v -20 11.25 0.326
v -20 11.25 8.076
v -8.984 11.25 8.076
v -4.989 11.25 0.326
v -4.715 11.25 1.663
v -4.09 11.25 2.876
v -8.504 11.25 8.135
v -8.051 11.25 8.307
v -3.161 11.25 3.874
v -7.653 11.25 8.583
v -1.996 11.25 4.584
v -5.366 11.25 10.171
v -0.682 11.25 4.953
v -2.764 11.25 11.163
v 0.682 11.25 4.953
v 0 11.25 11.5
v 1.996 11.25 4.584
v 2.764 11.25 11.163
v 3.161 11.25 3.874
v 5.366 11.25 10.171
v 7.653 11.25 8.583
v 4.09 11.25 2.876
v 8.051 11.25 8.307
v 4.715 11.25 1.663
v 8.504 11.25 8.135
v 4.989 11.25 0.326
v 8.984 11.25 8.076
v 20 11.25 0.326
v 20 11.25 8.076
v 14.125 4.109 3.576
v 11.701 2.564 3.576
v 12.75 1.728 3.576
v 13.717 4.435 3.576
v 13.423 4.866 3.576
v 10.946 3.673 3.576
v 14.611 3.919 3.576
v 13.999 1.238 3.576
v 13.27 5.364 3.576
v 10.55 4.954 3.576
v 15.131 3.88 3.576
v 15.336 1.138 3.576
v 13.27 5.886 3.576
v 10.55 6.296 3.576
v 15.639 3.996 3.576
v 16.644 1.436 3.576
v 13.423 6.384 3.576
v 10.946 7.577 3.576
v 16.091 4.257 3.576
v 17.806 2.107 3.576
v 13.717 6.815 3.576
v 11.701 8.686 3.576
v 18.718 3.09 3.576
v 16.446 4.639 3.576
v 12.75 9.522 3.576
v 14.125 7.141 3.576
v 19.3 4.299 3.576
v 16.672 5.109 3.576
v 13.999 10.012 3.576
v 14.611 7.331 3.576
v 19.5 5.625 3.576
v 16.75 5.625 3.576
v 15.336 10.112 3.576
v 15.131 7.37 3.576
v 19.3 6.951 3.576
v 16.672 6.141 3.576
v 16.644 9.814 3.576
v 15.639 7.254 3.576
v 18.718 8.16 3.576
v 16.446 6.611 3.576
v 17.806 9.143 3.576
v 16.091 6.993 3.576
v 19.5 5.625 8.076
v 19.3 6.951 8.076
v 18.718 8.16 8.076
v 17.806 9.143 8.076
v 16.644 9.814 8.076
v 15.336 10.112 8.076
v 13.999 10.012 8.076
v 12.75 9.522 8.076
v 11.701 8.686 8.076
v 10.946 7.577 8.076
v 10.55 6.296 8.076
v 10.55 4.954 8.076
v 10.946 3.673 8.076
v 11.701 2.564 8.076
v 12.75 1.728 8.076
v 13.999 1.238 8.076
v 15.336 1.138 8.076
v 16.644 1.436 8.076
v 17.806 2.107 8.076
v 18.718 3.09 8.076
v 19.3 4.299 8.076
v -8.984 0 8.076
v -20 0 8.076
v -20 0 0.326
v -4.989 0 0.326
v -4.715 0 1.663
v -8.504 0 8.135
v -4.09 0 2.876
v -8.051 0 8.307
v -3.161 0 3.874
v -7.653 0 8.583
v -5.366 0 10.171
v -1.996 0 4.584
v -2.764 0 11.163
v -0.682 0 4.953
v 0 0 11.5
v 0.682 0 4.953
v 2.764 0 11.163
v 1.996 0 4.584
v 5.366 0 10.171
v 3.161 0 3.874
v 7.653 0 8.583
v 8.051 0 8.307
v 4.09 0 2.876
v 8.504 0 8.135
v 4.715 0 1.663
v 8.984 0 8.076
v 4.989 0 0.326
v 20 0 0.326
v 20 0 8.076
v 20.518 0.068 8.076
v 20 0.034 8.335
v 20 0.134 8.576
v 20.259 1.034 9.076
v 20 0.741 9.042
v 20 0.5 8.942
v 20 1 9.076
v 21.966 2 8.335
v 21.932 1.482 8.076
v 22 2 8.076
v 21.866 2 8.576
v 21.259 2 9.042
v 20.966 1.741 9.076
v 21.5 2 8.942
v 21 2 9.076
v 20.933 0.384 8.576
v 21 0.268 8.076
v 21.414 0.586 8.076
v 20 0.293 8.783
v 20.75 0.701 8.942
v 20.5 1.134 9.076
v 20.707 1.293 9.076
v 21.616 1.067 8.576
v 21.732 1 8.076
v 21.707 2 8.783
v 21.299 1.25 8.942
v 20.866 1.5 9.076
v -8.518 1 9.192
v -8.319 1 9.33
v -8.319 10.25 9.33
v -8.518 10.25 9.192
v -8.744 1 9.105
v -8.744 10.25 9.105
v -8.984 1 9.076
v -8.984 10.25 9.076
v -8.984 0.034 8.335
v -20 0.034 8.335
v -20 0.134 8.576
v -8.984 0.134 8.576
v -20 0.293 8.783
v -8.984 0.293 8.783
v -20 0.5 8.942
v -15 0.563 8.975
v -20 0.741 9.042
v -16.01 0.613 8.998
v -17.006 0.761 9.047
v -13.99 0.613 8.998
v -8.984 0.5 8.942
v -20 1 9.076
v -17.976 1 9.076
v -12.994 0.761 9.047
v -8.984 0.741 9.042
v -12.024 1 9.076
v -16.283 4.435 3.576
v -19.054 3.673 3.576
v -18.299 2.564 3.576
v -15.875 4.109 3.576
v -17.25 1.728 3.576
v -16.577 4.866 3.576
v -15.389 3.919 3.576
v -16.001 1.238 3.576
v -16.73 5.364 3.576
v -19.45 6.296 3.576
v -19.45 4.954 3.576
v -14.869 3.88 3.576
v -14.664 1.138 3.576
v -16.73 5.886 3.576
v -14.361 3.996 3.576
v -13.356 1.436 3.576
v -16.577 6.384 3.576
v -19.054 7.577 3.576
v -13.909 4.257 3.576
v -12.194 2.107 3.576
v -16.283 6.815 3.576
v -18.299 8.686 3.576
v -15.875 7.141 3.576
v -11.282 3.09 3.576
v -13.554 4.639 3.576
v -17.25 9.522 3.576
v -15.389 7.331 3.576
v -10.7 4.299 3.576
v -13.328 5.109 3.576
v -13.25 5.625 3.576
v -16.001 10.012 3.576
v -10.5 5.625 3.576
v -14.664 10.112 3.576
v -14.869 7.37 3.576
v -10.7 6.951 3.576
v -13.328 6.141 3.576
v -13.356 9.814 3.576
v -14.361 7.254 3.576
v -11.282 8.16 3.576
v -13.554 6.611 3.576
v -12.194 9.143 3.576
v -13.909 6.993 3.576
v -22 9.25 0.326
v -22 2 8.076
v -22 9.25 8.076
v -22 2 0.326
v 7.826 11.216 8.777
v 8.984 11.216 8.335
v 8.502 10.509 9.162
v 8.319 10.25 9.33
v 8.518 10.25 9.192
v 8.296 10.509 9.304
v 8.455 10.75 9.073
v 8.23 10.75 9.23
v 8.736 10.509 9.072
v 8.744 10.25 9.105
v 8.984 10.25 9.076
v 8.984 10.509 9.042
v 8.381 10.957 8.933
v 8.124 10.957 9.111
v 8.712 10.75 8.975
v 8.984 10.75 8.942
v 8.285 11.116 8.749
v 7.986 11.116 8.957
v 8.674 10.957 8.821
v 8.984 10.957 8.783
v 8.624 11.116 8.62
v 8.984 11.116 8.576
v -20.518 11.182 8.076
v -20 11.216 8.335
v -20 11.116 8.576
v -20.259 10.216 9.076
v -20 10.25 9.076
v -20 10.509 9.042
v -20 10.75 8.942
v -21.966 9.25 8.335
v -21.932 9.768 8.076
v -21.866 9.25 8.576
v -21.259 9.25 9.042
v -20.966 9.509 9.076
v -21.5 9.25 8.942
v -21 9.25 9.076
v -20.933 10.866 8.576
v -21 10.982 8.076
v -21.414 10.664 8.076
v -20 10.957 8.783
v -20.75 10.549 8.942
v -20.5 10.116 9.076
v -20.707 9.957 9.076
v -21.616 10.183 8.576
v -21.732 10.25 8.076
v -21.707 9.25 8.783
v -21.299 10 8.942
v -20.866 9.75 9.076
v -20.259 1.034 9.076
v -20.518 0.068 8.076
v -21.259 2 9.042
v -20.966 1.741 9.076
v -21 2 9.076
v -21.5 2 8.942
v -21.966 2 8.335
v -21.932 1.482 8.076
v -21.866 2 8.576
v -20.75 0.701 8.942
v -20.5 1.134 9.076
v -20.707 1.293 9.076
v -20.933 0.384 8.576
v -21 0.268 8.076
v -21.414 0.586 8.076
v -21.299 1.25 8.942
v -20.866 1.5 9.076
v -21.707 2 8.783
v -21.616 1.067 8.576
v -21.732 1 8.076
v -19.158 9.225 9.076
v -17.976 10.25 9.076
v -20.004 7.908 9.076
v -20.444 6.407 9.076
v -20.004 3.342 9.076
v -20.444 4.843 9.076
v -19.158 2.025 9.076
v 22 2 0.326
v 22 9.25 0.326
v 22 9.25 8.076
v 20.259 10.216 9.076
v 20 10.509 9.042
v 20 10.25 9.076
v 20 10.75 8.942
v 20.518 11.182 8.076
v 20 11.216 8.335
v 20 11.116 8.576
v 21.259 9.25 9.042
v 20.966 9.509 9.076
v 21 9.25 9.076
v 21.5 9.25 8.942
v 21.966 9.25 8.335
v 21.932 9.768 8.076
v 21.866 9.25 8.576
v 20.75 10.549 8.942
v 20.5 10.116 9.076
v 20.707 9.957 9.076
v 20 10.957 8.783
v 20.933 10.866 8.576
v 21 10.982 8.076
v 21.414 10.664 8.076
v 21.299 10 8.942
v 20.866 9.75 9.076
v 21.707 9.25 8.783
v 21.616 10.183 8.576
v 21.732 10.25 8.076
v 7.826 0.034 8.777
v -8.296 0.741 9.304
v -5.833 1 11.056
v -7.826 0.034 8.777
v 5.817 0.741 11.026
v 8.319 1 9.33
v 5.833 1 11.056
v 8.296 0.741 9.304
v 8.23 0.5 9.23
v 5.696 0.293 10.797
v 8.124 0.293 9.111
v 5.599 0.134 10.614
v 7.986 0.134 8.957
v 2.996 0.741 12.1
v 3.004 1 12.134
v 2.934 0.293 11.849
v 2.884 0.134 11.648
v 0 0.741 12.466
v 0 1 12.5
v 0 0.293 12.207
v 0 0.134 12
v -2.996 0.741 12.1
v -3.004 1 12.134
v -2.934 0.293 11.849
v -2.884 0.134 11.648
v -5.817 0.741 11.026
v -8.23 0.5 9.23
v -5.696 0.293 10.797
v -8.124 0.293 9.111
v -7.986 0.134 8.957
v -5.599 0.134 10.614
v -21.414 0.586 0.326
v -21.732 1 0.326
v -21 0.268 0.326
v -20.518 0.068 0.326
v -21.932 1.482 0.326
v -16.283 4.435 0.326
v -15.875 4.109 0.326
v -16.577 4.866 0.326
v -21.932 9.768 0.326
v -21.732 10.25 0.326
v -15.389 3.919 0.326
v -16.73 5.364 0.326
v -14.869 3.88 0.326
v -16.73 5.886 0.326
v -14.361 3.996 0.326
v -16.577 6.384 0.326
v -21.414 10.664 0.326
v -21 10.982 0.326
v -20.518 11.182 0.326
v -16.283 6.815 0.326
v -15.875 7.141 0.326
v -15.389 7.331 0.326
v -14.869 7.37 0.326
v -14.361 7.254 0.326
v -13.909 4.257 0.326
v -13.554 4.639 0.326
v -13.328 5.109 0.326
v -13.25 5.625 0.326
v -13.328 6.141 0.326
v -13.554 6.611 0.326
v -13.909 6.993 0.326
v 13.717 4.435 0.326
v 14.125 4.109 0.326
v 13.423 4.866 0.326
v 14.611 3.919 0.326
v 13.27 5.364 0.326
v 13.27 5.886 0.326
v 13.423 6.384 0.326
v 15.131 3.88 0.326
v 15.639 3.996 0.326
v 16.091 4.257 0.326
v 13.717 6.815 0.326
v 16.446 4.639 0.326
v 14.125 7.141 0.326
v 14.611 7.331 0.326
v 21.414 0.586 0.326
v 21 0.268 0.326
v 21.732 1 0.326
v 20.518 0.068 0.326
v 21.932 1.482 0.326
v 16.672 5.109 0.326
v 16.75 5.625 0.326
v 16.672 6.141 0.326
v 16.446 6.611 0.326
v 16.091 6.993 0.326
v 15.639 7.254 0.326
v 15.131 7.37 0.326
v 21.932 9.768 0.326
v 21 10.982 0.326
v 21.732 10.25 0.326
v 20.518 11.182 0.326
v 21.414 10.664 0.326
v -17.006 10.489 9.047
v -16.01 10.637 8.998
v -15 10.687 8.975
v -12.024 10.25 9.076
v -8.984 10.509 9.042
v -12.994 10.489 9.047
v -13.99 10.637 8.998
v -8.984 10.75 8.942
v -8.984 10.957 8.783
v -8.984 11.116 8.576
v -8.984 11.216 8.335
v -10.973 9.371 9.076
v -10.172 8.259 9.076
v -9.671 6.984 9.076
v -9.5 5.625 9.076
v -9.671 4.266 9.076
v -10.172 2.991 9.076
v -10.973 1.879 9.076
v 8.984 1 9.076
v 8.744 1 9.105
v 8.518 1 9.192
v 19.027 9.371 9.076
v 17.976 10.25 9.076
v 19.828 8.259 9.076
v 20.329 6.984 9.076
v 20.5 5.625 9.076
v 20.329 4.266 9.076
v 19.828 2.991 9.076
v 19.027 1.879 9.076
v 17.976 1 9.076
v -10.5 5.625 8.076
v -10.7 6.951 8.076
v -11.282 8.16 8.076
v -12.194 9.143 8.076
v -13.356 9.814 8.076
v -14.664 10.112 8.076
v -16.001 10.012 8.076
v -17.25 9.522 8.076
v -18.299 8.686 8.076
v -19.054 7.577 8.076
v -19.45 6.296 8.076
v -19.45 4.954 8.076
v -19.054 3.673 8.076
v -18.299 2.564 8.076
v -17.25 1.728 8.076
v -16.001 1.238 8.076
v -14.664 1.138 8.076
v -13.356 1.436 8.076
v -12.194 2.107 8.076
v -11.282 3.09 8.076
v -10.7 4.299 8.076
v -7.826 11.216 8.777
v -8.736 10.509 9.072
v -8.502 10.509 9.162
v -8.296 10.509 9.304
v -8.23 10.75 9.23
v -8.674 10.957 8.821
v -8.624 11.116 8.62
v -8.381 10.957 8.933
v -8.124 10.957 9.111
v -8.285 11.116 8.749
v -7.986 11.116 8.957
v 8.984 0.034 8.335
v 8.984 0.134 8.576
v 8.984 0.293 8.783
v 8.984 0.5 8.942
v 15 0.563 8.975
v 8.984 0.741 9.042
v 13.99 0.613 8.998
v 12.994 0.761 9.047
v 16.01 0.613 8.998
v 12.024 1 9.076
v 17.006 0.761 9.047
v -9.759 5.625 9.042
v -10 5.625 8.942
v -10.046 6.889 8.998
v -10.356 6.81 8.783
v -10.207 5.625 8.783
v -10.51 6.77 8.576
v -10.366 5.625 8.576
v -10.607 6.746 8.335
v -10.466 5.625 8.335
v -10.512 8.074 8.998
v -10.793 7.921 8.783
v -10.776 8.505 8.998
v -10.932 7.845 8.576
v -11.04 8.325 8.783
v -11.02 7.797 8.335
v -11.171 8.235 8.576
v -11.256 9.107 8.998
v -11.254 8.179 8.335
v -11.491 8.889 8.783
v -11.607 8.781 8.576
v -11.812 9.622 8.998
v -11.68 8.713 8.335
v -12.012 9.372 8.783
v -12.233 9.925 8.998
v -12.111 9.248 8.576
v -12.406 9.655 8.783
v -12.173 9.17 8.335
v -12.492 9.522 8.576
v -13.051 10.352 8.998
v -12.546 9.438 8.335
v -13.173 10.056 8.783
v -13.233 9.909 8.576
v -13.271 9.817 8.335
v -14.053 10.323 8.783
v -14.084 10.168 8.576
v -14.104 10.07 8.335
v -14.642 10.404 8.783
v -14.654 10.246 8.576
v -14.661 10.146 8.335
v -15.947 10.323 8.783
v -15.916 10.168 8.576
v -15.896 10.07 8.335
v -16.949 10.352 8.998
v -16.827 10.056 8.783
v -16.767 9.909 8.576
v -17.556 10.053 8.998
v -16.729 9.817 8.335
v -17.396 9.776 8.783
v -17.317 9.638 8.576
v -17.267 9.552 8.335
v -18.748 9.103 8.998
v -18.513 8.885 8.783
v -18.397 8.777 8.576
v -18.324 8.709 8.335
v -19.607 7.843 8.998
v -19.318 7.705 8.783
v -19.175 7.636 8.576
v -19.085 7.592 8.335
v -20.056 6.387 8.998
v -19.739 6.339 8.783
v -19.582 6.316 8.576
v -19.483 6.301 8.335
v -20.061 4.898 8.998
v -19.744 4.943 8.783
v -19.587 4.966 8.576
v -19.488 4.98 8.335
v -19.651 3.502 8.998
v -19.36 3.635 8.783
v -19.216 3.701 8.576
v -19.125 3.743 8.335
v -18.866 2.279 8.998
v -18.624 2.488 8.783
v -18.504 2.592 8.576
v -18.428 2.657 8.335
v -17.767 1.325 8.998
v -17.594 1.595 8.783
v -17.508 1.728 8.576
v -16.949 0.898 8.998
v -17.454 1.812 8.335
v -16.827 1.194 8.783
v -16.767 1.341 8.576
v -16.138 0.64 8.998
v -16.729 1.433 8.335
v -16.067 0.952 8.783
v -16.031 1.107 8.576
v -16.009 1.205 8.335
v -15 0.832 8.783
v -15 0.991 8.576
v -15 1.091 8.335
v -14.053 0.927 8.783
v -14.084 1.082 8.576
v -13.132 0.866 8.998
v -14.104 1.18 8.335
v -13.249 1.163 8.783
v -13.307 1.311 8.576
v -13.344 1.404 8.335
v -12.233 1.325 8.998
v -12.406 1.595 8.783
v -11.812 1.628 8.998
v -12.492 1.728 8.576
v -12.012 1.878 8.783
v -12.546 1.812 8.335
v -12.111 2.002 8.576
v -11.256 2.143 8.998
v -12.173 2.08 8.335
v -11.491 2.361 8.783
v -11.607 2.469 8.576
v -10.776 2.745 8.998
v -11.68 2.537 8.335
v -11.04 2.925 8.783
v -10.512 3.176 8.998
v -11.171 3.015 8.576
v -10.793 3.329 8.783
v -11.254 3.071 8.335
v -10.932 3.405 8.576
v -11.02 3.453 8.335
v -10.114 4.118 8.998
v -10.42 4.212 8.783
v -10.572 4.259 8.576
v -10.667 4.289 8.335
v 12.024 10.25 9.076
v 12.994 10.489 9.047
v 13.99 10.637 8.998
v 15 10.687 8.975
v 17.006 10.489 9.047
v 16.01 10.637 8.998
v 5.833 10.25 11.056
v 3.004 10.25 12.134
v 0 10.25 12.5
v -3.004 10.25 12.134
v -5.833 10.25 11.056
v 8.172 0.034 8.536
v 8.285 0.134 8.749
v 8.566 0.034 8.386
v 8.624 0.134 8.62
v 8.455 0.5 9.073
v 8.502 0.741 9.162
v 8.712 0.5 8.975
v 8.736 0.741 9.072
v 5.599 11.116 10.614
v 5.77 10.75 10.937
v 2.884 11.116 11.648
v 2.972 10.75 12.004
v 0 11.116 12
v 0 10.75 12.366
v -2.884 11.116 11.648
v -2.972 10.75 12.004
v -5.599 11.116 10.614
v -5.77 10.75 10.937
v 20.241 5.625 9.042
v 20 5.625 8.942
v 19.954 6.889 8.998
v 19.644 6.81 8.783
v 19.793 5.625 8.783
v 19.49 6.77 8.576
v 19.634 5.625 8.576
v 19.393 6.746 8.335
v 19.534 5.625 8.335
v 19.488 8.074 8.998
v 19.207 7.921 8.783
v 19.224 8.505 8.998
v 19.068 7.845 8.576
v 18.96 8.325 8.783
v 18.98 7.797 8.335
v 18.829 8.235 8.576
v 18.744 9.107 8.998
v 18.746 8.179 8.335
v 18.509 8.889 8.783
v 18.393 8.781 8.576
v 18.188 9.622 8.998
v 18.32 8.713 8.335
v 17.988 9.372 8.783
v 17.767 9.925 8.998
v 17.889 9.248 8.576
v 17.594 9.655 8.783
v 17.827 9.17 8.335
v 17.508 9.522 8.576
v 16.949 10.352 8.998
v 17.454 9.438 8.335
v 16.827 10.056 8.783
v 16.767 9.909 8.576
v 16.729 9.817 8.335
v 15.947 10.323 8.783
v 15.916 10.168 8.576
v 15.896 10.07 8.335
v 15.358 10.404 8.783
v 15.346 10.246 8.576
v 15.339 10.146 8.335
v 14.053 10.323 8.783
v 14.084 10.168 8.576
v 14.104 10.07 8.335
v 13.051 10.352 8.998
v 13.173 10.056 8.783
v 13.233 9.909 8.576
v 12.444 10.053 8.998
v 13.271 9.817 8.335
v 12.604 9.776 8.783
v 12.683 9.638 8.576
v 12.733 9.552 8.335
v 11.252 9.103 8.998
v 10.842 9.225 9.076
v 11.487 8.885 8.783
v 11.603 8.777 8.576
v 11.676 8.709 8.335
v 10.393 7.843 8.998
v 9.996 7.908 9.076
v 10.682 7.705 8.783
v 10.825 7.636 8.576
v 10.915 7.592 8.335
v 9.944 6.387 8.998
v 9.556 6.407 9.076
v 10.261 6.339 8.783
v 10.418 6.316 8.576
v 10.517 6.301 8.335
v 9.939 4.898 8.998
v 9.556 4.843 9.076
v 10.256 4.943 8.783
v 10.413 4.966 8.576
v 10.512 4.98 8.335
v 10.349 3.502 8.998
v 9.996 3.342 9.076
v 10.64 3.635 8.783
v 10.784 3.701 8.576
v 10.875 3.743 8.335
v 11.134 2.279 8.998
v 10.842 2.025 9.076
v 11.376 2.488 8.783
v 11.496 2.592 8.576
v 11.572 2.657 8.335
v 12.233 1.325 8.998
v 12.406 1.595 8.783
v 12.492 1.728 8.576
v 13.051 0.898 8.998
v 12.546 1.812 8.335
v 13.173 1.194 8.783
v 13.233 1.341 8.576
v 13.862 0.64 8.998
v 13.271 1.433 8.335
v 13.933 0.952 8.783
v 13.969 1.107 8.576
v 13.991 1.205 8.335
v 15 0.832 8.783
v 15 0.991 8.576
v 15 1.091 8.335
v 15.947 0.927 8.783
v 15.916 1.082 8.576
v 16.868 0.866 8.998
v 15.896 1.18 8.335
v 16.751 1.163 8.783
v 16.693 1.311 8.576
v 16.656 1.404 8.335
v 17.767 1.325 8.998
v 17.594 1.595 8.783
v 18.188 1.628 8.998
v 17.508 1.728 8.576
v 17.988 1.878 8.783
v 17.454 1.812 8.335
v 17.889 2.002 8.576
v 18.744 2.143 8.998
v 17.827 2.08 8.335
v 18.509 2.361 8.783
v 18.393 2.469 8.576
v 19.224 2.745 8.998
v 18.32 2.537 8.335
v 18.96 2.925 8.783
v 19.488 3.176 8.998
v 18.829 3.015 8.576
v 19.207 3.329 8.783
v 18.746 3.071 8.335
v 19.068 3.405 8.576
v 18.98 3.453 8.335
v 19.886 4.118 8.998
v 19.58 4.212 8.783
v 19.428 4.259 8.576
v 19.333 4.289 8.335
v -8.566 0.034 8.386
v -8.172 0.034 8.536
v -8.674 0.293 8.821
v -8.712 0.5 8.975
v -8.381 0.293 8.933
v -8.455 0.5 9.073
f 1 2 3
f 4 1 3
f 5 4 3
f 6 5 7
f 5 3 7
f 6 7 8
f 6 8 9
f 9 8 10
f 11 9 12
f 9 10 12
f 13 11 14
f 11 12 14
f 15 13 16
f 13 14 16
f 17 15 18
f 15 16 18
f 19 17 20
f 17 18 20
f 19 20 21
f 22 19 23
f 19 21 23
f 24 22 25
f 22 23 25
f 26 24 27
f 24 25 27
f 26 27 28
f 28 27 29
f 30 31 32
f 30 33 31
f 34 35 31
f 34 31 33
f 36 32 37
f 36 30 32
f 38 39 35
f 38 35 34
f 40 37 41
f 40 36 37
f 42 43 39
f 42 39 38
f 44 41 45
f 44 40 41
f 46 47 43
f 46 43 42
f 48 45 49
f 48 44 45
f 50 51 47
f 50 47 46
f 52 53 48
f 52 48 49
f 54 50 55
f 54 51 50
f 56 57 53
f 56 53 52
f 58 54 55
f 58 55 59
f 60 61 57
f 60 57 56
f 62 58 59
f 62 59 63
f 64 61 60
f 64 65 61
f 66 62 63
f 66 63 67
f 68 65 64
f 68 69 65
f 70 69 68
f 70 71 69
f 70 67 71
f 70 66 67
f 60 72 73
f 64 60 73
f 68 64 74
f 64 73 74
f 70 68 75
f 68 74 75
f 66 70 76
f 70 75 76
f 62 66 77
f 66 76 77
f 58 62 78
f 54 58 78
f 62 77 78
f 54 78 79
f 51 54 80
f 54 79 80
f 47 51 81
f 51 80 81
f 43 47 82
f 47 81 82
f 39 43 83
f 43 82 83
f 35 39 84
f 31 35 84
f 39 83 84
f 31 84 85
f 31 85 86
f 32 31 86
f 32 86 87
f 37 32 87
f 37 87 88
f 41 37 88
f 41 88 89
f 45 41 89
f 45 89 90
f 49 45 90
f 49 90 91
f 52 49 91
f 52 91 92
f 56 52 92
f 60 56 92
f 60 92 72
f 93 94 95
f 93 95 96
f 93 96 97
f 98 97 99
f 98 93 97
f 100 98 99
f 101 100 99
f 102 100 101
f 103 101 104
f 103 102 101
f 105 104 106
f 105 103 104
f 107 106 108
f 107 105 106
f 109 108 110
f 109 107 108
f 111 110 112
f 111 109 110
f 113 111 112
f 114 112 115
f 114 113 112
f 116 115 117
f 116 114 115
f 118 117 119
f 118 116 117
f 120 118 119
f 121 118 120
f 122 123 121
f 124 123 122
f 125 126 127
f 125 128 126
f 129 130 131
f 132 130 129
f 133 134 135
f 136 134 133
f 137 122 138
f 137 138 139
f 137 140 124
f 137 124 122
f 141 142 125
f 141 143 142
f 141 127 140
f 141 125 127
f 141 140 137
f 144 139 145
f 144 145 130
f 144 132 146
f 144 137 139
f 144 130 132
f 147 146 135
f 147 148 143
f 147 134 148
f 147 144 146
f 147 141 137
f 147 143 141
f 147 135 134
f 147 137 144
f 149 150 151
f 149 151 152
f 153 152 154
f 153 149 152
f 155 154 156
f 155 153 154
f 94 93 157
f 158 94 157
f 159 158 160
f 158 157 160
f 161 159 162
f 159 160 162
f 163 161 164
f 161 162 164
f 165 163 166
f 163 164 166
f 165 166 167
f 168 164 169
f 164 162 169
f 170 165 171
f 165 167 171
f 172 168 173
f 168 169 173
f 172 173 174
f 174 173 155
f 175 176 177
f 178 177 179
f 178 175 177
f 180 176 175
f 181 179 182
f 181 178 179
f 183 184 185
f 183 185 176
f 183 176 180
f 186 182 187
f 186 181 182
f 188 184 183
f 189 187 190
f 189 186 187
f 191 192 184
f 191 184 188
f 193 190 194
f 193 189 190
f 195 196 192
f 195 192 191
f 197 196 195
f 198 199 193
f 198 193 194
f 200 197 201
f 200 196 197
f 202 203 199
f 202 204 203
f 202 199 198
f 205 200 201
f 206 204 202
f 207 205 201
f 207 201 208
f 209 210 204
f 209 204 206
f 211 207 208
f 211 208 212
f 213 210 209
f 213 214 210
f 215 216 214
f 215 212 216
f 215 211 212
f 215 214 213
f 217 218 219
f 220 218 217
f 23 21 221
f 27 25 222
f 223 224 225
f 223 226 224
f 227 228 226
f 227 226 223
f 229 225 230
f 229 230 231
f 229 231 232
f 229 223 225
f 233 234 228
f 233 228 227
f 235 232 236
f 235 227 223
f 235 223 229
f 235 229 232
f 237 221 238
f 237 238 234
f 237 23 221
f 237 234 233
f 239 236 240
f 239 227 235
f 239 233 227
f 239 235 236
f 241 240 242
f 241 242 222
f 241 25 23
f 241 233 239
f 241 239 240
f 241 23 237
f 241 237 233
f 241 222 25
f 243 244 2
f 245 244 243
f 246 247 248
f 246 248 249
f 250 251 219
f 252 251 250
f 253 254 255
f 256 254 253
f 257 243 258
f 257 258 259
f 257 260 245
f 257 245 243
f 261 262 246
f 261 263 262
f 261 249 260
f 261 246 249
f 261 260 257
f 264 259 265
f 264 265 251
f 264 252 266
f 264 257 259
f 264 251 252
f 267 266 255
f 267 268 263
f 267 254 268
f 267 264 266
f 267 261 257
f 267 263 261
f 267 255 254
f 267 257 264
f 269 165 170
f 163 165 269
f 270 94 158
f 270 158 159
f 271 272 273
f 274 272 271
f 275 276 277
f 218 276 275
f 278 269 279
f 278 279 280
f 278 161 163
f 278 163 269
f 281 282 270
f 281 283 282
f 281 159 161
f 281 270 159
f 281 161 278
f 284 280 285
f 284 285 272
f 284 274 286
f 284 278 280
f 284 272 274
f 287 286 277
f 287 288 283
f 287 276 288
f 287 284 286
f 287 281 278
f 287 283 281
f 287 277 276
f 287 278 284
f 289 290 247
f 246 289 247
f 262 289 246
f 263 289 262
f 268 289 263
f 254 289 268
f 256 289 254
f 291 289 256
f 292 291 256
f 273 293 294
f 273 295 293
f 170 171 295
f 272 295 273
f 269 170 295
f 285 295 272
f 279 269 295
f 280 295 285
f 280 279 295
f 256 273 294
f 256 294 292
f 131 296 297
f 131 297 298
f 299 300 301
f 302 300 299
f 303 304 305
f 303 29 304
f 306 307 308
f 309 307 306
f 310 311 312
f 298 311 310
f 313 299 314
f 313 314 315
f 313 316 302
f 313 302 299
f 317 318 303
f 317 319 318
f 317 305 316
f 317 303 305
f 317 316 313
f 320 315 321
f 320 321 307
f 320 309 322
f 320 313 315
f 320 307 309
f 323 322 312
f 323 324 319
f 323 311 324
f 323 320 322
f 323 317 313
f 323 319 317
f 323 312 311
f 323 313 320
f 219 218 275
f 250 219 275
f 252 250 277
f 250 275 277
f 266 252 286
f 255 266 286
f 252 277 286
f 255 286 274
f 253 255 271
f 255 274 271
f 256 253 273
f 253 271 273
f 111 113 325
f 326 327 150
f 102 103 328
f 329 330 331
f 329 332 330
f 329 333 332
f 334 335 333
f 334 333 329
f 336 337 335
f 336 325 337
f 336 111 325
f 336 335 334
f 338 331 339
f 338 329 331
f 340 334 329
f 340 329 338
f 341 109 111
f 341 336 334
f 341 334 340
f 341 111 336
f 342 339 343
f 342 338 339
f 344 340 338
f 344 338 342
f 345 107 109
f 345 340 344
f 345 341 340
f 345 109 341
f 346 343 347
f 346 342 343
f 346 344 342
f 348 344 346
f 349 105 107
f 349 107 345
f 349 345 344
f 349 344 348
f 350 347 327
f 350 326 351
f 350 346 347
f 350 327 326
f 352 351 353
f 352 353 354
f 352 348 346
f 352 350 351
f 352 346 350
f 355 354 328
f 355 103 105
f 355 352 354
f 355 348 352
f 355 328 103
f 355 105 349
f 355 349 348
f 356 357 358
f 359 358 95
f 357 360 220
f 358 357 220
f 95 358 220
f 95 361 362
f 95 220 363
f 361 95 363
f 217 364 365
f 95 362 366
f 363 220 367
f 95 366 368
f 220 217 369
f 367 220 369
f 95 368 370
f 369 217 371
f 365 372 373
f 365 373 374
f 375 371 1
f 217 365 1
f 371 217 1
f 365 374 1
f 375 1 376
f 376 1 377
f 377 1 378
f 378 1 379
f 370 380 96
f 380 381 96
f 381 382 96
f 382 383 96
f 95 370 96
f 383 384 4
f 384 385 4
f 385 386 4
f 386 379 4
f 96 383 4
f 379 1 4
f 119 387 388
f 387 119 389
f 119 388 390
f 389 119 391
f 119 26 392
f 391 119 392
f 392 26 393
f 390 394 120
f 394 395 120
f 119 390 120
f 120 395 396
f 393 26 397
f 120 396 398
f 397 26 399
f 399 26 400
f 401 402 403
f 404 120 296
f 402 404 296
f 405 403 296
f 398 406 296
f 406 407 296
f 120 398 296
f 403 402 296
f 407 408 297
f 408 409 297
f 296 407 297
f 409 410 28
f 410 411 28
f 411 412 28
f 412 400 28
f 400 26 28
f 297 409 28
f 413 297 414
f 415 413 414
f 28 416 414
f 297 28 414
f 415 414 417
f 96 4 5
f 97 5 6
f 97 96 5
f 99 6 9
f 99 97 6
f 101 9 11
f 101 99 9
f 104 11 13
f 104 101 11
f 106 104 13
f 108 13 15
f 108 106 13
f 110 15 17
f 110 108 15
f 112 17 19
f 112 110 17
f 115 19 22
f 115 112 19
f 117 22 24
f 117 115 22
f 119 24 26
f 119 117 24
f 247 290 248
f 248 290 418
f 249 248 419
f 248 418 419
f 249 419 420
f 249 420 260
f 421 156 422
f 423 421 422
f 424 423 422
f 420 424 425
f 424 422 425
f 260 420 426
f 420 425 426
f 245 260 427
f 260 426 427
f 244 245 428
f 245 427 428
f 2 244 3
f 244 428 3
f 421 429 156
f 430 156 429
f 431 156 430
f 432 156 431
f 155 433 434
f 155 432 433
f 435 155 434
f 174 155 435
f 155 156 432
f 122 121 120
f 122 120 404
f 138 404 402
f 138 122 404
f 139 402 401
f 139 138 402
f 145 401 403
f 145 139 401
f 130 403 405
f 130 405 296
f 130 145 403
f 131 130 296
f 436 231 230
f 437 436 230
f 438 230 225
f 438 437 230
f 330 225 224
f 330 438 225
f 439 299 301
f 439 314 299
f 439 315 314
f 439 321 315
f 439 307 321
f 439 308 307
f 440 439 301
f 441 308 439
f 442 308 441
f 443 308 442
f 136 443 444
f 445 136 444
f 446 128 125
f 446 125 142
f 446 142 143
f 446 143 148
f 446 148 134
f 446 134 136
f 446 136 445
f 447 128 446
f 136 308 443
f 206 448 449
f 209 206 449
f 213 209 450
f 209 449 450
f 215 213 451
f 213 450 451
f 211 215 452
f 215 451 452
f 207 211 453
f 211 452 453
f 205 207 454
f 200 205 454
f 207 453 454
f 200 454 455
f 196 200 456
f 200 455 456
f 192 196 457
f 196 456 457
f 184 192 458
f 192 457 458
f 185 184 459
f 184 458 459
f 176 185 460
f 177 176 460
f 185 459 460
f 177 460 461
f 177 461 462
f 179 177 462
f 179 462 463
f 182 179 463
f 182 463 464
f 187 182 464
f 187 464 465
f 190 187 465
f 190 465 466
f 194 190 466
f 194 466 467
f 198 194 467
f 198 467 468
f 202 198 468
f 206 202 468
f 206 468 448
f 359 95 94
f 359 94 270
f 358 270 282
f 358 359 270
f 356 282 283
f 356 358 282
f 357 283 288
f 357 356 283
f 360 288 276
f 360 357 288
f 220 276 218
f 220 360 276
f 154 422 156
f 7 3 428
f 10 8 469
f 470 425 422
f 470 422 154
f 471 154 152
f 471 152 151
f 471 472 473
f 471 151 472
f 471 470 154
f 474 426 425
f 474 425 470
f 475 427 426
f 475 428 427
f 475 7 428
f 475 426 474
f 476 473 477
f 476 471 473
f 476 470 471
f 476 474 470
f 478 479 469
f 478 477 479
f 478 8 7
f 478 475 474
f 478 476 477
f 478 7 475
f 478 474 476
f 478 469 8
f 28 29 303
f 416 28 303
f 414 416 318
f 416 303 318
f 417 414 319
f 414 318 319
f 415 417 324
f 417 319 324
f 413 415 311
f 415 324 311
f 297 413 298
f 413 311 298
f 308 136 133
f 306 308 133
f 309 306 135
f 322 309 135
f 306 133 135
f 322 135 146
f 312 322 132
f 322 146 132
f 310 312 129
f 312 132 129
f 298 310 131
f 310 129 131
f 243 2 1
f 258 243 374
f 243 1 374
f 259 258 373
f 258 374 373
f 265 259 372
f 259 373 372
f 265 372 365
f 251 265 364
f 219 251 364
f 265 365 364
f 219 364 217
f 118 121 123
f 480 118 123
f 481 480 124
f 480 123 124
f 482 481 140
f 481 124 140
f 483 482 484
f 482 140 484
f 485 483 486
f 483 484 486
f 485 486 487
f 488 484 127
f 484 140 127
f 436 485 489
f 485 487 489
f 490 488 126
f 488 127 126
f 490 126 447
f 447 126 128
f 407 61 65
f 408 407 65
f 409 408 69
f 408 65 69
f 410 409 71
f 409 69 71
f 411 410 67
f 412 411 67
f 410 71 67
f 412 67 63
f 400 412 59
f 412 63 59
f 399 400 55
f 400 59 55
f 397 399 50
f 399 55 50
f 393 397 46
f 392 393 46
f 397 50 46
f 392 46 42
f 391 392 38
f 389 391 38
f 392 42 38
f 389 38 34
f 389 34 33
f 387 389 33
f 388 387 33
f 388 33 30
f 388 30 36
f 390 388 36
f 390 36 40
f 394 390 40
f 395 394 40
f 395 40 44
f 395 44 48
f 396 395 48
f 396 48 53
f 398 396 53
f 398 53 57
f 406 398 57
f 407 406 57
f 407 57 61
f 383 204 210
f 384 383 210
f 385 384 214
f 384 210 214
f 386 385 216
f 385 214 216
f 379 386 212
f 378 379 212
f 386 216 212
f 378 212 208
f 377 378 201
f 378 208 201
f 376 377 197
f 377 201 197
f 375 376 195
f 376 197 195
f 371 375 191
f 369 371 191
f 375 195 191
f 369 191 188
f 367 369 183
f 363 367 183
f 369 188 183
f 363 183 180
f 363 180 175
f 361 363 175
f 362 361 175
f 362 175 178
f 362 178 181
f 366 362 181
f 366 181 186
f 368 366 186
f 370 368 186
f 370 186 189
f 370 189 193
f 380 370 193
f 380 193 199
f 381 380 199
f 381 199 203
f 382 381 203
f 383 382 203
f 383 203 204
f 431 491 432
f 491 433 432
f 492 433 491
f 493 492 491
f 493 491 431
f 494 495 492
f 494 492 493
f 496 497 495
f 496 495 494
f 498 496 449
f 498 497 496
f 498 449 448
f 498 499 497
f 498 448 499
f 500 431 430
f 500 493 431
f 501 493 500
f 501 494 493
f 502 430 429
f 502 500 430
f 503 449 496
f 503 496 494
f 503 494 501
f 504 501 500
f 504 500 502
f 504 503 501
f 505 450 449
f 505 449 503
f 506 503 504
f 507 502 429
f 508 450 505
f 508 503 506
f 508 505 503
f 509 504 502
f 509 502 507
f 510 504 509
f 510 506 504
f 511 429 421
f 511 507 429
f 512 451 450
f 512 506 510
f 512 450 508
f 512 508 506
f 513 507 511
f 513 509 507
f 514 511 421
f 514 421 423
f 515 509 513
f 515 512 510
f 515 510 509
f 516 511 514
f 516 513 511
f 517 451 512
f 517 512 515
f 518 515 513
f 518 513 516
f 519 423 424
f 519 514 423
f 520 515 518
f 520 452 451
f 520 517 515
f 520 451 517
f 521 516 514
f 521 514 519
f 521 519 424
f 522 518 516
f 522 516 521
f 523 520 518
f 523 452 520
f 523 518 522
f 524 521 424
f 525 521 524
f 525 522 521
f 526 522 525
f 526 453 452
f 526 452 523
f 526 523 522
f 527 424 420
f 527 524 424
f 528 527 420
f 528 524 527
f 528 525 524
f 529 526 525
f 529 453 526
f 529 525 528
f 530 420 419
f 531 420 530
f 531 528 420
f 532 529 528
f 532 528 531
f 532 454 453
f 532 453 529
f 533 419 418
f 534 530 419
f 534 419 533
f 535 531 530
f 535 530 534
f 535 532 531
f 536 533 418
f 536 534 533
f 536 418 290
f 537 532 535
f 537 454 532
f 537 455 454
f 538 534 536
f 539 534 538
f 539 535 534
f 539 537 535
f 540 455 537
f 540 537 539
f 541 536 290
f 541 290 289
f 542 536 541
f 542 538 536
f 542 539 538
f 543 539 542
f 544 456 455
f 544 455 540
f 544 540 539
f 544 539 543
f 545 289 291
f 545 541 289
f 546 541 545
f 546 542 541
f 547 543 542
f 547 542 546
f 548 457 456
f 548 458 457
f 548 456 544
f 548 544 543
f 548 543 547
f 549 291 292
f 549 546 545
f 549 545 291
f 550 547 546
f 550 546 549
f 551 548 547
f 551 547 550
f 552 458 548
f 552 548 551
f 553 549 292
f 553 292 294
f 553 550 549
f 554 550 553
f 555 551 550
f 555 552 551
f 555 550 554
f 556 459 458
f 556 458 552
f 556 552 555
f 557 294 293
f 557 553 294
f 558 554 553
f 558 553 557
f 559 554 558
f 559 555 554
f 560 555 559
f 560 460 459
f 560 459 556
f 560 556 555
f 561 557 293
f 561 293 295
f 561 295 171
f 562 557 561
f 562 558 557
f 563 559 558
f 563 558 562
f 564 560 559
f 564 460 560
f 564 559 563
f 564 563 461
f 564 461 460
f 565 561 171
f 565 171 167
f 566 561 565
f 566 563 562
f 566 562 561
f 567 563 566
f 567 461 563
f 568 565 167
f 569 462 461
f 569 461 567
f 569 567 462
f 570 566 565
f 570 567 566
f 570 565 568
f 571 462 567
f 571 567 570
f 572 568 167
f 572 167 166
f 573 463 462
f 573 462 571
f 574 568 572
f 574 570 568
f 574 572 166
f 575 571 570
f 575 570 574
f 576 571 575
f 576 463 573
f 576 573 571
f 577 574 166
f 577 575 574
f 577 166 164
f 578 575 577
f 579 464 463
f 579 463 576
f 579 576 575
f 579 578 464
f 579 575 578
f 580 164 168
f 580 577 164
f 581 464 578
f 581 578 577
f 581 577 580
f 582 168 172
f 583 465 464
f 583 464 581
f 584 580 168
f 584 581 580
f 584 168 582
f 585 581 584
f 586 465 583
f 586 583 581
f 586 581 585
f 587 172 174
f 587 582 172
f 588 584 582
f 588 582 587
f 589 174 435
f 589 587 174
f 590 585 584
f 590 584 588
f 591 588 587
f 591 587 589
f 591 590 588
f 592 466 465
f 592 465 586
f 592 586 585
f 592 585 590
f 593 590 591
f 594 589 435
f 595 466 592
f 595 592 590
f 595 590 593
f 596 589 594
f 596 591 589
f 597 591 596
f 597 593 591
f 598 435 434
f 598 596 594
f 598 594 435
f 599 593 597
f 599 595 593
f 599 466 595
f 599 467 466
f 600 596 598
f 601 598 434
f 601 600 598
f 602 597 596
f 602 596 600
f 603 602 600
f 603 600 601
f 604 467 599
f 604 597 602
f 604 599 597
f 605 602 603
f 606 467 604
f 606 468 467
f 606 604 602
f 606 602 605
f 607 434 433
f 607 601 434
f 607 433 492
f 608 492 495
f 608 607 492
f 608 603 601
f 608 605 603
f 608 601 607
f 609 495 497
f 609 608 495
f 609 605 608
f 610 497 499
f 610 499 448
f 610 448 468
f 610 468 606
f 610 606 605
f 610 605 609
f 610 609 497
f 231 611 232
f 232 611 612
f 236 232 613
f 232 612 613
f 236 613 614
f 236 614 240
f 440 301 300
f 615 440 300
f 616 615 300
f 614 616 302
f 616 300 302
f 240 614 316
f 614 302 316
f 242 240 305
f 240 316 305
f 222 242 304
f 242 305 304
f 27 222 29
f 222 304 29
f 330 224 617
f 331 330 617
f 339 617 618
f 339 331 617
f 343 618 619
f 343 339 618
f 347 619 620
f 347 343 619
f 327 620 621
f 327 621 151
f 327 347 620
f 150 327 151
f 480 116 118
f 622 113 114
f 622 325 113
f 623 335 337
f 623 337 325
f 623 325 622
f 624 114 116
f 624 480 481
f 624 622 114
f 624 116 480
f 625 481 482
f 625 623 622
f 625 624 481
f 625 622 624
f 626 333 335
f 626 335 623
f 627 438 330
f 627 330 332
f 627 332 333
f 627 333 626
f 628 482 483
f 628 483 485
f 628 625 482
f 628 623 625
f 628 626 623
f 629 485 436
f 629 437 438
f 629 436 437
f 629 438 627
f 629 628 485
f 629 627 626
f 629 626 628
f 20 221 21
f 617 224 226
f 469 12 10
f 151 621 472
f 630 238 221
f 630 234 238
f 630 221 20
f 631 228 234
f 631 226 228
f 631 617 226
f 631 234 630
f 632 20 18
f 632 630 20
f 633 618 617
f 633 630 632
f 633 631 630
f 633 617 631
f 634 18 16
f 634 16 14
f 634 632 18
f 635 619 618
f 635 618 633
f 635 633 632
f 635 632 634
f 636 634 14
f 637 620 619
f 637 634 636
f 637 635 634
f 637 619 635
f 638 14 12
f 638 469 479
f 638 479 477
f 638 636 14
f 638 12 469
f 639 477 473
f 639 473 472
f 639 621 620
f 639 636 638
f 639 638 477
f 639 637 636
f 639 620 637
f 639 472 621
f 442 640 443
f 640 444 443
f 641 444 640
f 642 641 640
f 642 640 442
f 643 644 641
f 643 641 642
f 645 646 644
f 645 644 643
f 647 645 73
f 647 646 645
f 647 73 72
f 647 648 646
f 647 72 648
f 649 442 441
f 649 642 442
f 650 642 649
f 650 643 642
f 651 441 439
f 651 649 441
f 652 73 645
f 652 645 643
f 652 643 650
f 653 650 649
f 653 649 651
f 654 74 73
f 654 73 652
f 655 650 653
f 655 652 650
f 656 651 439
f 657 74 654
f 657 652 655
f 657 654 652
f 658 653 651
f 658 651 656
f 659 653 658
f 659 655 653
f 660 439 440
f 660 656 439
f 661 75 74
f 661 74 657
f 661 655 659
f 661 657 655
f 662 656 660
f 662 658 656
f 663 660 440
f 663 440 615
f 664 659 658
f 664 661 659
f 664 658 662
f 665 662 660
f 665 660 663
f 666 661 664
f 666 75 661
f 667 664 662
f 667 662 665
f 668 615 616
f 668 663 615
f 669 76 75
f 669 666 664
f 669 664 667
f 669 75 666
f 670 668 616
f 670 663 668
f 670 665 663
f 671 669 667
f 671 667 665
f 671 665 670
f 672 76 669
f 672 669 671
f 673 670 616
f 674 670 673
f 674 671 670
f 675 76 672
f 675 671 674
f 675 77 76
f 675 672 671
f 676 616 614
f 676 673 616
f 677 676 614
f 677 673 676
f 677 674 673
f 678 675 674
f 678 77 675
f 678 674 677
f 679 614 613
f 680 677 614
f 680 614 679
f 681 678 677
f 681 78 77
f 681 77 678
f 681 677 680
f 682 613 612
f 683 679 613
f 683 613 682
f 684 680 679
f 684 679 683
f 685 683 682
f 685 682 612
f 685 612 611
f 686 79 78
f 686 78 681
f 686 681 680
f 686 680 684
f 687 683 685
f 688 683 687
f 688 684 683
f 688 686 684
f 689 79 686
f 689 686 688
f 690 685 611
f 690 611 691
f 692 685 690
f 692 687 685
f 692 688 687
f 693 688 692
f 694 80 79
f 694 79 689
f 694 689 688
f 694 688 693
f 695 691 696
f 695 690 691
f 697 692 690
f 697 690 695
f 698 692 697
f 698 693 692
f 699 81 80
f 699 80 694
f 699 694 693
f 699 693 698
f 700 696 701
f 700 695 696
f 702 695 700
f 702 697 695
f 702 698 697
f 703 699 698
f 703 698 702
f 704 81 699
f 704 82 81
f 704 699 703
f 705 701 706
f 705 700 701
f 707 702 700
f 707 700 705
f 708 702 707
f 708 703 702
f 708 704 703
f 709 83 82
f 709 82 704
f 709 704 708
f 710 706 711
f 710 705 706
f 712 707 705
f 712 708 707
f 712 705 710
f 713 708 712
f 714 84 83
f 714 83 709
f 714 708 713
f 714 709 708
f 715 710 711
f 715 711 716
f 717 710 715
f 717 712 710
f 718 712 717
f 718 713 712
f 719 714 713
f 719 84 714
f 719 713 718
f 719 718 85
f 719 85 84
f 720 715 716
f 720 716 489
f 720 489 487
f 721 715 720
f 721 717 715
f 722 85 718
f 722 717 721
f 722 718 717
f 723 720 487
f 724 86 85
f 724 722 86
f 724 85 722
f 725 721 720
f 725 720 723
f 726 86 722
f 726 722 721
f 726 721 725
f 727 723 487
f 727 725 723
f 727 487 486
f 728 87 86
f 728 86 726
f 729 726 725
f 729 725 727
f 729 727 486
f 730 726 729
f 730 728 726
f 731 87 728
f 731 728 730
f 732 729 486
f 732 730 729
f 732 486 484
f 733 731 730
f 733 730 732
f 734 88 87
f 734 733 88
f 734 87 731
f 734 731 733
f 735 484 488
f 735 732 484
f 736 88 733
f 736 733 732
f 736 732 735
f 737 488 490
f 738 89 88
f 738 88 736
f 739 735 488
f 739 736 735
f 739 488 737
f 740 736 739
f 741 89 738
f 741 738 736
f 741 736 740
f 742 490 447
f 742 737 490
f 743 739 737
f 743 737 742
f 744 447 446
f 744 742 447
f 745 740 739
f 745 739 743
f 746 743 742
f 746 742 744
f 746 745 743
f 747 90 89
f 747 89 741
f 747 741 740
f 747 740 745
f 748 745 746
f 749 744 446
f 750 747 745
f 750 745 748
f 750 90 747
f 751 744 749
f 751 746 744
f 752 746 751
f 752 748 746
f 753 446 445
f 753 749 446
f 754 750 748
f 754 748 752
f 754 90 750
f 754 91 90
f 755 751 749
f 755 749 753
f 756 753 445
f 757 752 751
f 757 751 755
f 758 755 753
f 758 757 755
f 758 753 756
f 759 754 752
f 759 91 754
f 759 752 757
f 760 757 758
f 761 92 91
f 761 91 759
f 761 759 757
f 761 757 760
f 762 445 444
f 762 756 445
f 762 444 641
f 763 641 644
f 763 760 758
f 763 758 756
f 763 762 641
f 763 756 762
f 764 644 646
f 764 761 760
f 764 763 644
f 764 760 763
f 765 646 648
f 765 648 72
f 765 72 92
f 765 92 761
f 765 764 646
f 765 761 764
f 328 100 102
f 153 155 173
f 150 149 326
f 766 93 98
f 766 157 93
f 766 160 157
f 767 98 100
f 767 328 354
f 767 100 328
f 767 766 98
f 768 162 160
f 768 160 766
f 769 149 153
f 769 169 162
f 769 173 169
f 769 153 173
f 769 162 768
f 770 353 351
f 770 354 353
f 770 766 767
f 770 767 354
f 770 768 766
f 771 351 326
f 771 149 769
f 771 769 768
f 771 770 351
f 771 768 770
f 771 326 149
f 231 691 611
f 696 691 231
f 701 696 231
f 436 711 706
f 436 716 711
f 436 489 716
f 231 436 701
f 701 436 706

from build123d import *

# Parameters (mm, degrees)
BOSS_EXTRUDE2_DEPTH = 11.25
SKETCH3_R           = 1.75
CUT_EXTRUDE1_DEPTH  = 15
SKETCH4_R           = 4.5
CUT_EXTRUDE2_DEPTH  = 5.5
FILLET1_R           = 2
FILLET2_R           = 1
SKETCH5_W           = 43.999736238
SKETCH5_H           = 0.25
CUT_EXTRUDE3_DEPTH  = 20


with BuildPart() as part:
    # Sketch2 → Boss-Extrude2 (new body)
    with BuildSketch(Plane(origin=(0, 0, 0), x_dir=(1, 0, 0), z_dir=(0, 1, 0))):
        with BuildLine():
            Line((4.999419692, -0.076175713), (21.999868119, -0.076175713))
            Line((21.999868119, -0.076175713), (21.999868119, -9.076175713))
            Line((21.999868119, -9.076175713), (8.594942375, -9.076175713))
            ThreePointArc((8.594942375, -9.076175713), (0, -12.5), (-8.594942375, -9.076175713))
            Line((-8.594942375, -9.076175713), (-21.999868119, -9.076175713))
            Line((-21.999868119, -9.076175713), (-21.999868119, -0.076175713))
            Line((-21.999868119, -0.076175713), (-4.999419692, -0.076175713))
            ThreePointArc((-4.999419692, -0.076175713), (0, -5), (4.999419692, -0.076175713))
        make_face()
    extrude(amount=BOSS_EXTRUDE2_DEPTH)

    # Sketch3 → Cut-Extrude1 (cut)
    with BuildSketch(Plane.XY.offset(9.076175713)):
        with Locations((15, 5.625)):
            Circle(SKETCH3_R)
        with Locations((-15, 5.625)):
            Circle(SKETCH3_R)
    extrude(amount=-CUT_EXTRUDE1_DEPTH, mode=Mode.SUBTRACT)

    # Sketch4 → Cut-Extrude2 (cut)
    with BuildSketch(Plane.XY.offset(9.076175713)):
        with Locations((15, 5.625)):
            Circle(SKETCH4_R)
        with Locations((-15, 5.625)):
            Circle(SKETCH4_R)
    extrude(amount=-CUT_EXTRUDE2_DEPTH, mode=Mode.SUBTRACT)

    # Fillet1
    fillet1_edges = [part.edges().sort_by_distance(p)[0] for p in [
        (-21.999868119, 11.25, 4.576175713),
        (21.999868119, 11.25, 4.576175713),
        (21.999868119, 0, 4.576175713),
        (-21.999868119, 0, 4.576175713),
    ]]
    fillet(fillet1_edges, radius=FILLET1_R)

    # Fillet2
    # the kernel refuses this fillet: 1 mm, written as the material it adds along each edge
    with BuildSketch(Plane(origin=(8.594942375, 0, 9.076175713), x_dir=(-0.7363214838652496, 0, 0.6766318588408892), z_dir=(0, 1, 0))) as fillet2_piece_1:
        with BuildLine():
            CenterArc((0.389815045, 0.9998876), FILLET2_R, 227.418998023, 41.721940681)
            Line((-0.286816814, 0.263566116), (0, 0))
            ThreePointArc((0, 0), (0.187411079, 0.001404995), (0.374822159, 0))
        make_face()
    extrude(amount=11.25)
    with BuildSketch(Plane(origin=(-8.594942375, 0, 9.076175713), x_dir=(-1, 0, 0), z_dir=(0, 1, 0))) as fillet2_piece_2:
        with BuildLine():
            CenterArc((0.389526613, 1), FILLET2_R, 228.278059319, 41.721940681)
            ThreePointArc((-0.275989608, 0.253616614), (-0.137044139, 0.127842835), (0, 0))
            Line((0, 0), (0.389526613, 0))
        make_face()
    extrude(amount=11.25)
    # the kernel refuses this fillet: 1 mm, written as the material it takes off along each edge
    with BuildSketch(Plane(origin=(15, 5.625, 9.076175713), x_dir=(1, 0, 0), z_dir=(0, -1, 0))) as fillet2_2_piece_1:
        with BuildLine():
            CenterArc((4.5 + FILLET2_R, -FILLET2_R), FILLET2_R, 90, 90)
            Line((4.5, -FILLET2_R), (4.5, 0))
            Line((4.5, 0), (4.5 + FILLET2_R, 0))
        make_face()
    revolve(axis=Axis((15, 5.625, 9.076175713), (0, 0, 1)), mode=Mode.SUBTRACT)
    with BuildSketch(Plane(origin=(-15, 5.625, 9.076175713), x_dir=(1, 0, 0), z_dir=(0, -1, 0))) as fillet2_2_piece_2:
        with BuildLine():
            CenterArc((4.5 + FILLET2_R, -FILLET2_R), FILLET2_R, 90, 90)
            Line((4.5, -FILLET2_R), (4.5, 0))
            Line((4.5, 0), (4.5 + FILLET2_R, 0))
        make_face()
    revolve(axis=Axis((-15, 5.625, 9.076175713), (0, 0, 1)), mode=Mode.SUBTRACT)
    # the kernel refuses this fillet: 1 mm, written as the material it takes off along each edge
    with BuildSketch(Plane(origin=(0, 11.25, 0), x_dir=(0.6655162213477791, 0, 0.7463833861514965), z_dir=(0.7463833861514965, 0, -0.6655162213477791))) as fillet2_3_piece_1:
        with BuildLine():
            CenterArc((12.5 - FILLET2_R, FILLET2_R), FILLET2_R, 270, 90)
            Line((12.5, FILLET2_R), (12.5, 0))
            Line((12.5, 0), (12.5 - FILLET2_R, 0))
        make_face()
    revolve(axis=Axis((0, 11.25, 0), (0, -1, 0)), revolution_arc=83.443881362, mode=Mode.SUBTRACT)
    with BuildSketch(Plane(origin=(19.999868119, 11.25, 9.076175713), x_dir=(0, 0, -1), z_dir=(-1, 0, 0)), Plane(origin=(-8.984468988, 0, 9.076175713), x_dir=(0, 1, 0), z_dir=(-1, 0, 0))) as fillet2_3_piece_2:
        with BuildLine():
            CenterArc((FILLET2_R, FILLET2_R), FILLET2_R, 180, 90)
            Line((0, FILLET2_R), (0, 0))
            Line((0, 0), (FILLET2_R, 0))
        make_face()
    extrude(amount=11.015399131, mode=Mode.SUBTRACT)
    with BuildSketch(Plane(origin=(21.999868119, 2, 9.076175713), x_dir=(-1, 0, 0), z_dir=(0, 1, 0))) as fillet2_3_piece_3:
        with BuildLine():
            CenterArc((FILLET2_R, -FILLET2_R), FILLET2_R, 90, 90)
            Line((0, -FILLET2_R), (0, 0))
            Line((0, 0), (FILLET2_R, 0))
        make_face()
    extrude(amount=7.25, mode=Mode.SUBTRACT)
    with BuildSketch(Plane(origin=(19.999868119, 9.25, 9.076175713), x_dir=(0, 1, 0), z_dir=(-1, 0, 0))) as fillet2_3_piece_4:
        with BuildLine():
            CenterArc((2 - FILLET2_R, FILLET2_R), FILLET2_R, 270, 90)
            Line((2, FILLET2_R), (2, 0))
            Line((2, 0), (2 - FILLET2_R, 0))
        make_face()
    revolve(axis=Axis((19.999868119, 9.25, 9.076175713), (0, 0, -1)), revolution_arc=90, mode=Mode.SUBTRACT)
    with BuildSketch(Plane(origin=(19.999868119, 2, 9.076175713), x_dir=(0, -1, 0), z_dir=(-1, 0, 0))) as fillet2_3_piece_5:
        with BuildLine():
            CenterArc((2 - FILLET2_R, -FILLET2_R), FILLET2_R, 0, 90)
            Line((2 - FILLET2_R, 0), (2, 0))
            Line((2, 0), (2, -FILLET2_R))
        make_face()
    revolve(axis=Axis((19.999868119, 2, 9.076175713), (0, 0, 1)), revolution_arc=90, mode=Mode.SUBTRACT)
    with BuildSketch(Plane(origin=(-8.984468988, 11.25, 9.076175713), x_dir=(0, -1, 0), z_dir=(-1, 0, 0)), Plane(origin=(19.999868119, 0, 9.076175713), x_dir=(0, 0, -1), z_dir=(-1, 0, 0))) as fillet2_3_piece_6:
        with BuildLine():
            CenterArc((FILLET2_R, -FILLET2_R), FILLET2_R, 90, 90)
            Line((0, -FILLET2_R), (0, 0))
            Line((0, 0), (FILLET2_R, 0))
        make_face()
    extrude(amount=11.015399131, mode=Mode.SUBTRACT)
    with BuildSketch(Plane(origin=(-21.999868119, 2, 9.076175713), x_dir=(1, 0, 0), z_dir=(0, 1, 0))) as fillet2_3_piece_7:
        with BuildLine():
            CenterArc((FILLET2_R, FILLET2_R), FILLET2_R, 180, 90)
            Line((0, FILLET2_R), (0, 0))
            Line((0, 0), (FILLET2_R, 0))
        make_face()
    extrude(amount=7.25, mode=Mode.SUBTRACT)
    with BuildSketch(Plane(origin=(-19.999868119, 9.25, 9.076175713), x_dir=(0, 1, 0), z_dir=(1, 0, 0))) as fillet2_3_piece_8:
        with BuildLine():
            CenterArc((2 - FILLET2_R, -FILLET2_R), FILLET2_R, 360, 90)
            Line((2, -FILLET2_R), (2, 0))
            Line((2, 0), (2 - FILLET2_R, 0))
        make_face()
    revolve(axis=Axis((-19.999868119, 9.25, 9.076175713), (0, 0, 1)), revolution_arc=90, mode=Mode.SUBTRACT)
    with BuildSketch(Plane(origin=(-19.999868119, 2, 9.076175713), x_dir=(0, -1, 0), z_dir=(1, 0, 0))) as fillet2_3_piece_9:
        with BuildLine():
            CenterArc((2 - FILLET2_R, FILLET2_R), FILLET2_R, 270, 90)
            Line((2, FILLET2_R), (2, 0))
            Line((2, 0), (2 - FILLET2_R, 0))
        make_face()
    revolve(axis=Axis((-19.999868119, 2, 9.076175713), (0, 0, -1)), revolution_arc=90, mode=Mode.SUBTRACT)
    with BuildSketch(Plane(origin=(0, 0, 0), x_dir=(0.6655162213477791, 0, 0.7463833861514965), z_dir=(0.7463833861514965, 0, -0.6655162213477791))) as fillet2_3_piece_10:
        with BuildLine():
            CenterArc((12.5 - FILLET2_R, -FILLET2_R), FILLET2_R, 0, 90)
            Line((12.5, -FILLET2_R), (12.5, 0))
            Line((12.5, 0), (12.5 - FILLET2_R, 0))
        make_face()
    revolve(axis=Axis((0, 0, 0), (0, -1, 0)), revolution_arc=83.443881362, mode=Mode.SUBTRACT)
    with BuildSketch(Plane(origin=(8.984468988, 0, 10.076175713), x_dir=(-0.6655162213477794, 0, -0.7463833861514964), z_dir=(-0.7463833861514964, 0, 0.6655162213477794))) as fillet2_3_piece_11:
        with BuildLine():
            CenterArc((1 + FILLET2_R, -FILLET2_R), FILLET2_R, 90, 90)
            Line((1, -FILLET2_R), (1, 0))
            Line((1, 0), (1 + FILLET2_R, 0))
        make_face()
    revolve(axis=Axis((8.984468988, 0, 10.076175713), (0, -1, 0)), revolution_arc=41.721940681, mode=Mode.SUBTRACT)
    with BuildSketch(Plane(origin=(-8.984468988, 0, 10.076175713), x_dir=(0, 0, -1), z_dir=(-1, 0, 0))) as fillet2_3_piece_12:
        with BuildLine():
            CenterArc((1 + FILLET2_R, -FILLET2_R), FILLET2_R, 90, 90)
            Line((1, -FILLET2_R), (1, 0))
            Line((1, 0), (1 + FILLET2_R, 0))
        make_face()
    revolve(axis=Axis((-8.984468988, 0, 10.076175713), (0, -1, 0)), revolution_arc=41.721940681, mode=Mode.SUBTRACT)
    with BuildSketch(Plane(origin=(-8.984468988, 11.25, 10.076175713), x_dir=(0, 0, -1), z_dir=(-1, 0, 0))) as fillet2_3_piece_13:
        with BuildLine():
            CenterArc((1 + FILLET2_R, FILLET2_R), FILLET2_R, 180, 90)
            Line((1 + FILLET2_R, 0), (1, 0))
            Line((1, 0), (1, FILLET2_R))
        make_face()
    revolve(axis=Axis((-8.984468988, 11.25, 10.076175713), (0, -1, 0)), revolution_arc=41.721940681, mode=Mode.SUBTRACT)
    with BuildSketch(Plane(origin=(8.984468988, 11.25, 10.076175713), x_dir=(-0.6655162213477794, 0, -0.7463833861514964), z_dir=(-0.7463833861514964, 0, 0.6655162213477794))) as fillet2_3_piece_14:
        with BuildLine():
            CenterArc((1 + FILLET2_R, FILLET2_R), FILLET2_R, 180, 90)
            Line((1, FILLET2_R), (1, 0))
            Line((1, 0), (1 + FILLET2_R, 0))
        make_face()
    revolve(axis=Axis((8.984468988, 11.25, 10.076175713), (0, -1, 0)), revolution_arc=41.721940681, mode=Mode.SUBTRACT)

    # Sketch5 → Cut-Extrude3 (cut)
    with BuildSketch(Plane(origin=(0, 11.25, 0), x_dir=(1, 0, 0), z_dir=(0, 1, 0))):
        with Locations((0, -0.201175713)):
            Rectangle(SKETCH5_W, SKETCH5_H)
    extrude(amount=-CUT_EXTRUDE3_DEPTH, mode=Mode.SUBTRACT)


solid = part.part
